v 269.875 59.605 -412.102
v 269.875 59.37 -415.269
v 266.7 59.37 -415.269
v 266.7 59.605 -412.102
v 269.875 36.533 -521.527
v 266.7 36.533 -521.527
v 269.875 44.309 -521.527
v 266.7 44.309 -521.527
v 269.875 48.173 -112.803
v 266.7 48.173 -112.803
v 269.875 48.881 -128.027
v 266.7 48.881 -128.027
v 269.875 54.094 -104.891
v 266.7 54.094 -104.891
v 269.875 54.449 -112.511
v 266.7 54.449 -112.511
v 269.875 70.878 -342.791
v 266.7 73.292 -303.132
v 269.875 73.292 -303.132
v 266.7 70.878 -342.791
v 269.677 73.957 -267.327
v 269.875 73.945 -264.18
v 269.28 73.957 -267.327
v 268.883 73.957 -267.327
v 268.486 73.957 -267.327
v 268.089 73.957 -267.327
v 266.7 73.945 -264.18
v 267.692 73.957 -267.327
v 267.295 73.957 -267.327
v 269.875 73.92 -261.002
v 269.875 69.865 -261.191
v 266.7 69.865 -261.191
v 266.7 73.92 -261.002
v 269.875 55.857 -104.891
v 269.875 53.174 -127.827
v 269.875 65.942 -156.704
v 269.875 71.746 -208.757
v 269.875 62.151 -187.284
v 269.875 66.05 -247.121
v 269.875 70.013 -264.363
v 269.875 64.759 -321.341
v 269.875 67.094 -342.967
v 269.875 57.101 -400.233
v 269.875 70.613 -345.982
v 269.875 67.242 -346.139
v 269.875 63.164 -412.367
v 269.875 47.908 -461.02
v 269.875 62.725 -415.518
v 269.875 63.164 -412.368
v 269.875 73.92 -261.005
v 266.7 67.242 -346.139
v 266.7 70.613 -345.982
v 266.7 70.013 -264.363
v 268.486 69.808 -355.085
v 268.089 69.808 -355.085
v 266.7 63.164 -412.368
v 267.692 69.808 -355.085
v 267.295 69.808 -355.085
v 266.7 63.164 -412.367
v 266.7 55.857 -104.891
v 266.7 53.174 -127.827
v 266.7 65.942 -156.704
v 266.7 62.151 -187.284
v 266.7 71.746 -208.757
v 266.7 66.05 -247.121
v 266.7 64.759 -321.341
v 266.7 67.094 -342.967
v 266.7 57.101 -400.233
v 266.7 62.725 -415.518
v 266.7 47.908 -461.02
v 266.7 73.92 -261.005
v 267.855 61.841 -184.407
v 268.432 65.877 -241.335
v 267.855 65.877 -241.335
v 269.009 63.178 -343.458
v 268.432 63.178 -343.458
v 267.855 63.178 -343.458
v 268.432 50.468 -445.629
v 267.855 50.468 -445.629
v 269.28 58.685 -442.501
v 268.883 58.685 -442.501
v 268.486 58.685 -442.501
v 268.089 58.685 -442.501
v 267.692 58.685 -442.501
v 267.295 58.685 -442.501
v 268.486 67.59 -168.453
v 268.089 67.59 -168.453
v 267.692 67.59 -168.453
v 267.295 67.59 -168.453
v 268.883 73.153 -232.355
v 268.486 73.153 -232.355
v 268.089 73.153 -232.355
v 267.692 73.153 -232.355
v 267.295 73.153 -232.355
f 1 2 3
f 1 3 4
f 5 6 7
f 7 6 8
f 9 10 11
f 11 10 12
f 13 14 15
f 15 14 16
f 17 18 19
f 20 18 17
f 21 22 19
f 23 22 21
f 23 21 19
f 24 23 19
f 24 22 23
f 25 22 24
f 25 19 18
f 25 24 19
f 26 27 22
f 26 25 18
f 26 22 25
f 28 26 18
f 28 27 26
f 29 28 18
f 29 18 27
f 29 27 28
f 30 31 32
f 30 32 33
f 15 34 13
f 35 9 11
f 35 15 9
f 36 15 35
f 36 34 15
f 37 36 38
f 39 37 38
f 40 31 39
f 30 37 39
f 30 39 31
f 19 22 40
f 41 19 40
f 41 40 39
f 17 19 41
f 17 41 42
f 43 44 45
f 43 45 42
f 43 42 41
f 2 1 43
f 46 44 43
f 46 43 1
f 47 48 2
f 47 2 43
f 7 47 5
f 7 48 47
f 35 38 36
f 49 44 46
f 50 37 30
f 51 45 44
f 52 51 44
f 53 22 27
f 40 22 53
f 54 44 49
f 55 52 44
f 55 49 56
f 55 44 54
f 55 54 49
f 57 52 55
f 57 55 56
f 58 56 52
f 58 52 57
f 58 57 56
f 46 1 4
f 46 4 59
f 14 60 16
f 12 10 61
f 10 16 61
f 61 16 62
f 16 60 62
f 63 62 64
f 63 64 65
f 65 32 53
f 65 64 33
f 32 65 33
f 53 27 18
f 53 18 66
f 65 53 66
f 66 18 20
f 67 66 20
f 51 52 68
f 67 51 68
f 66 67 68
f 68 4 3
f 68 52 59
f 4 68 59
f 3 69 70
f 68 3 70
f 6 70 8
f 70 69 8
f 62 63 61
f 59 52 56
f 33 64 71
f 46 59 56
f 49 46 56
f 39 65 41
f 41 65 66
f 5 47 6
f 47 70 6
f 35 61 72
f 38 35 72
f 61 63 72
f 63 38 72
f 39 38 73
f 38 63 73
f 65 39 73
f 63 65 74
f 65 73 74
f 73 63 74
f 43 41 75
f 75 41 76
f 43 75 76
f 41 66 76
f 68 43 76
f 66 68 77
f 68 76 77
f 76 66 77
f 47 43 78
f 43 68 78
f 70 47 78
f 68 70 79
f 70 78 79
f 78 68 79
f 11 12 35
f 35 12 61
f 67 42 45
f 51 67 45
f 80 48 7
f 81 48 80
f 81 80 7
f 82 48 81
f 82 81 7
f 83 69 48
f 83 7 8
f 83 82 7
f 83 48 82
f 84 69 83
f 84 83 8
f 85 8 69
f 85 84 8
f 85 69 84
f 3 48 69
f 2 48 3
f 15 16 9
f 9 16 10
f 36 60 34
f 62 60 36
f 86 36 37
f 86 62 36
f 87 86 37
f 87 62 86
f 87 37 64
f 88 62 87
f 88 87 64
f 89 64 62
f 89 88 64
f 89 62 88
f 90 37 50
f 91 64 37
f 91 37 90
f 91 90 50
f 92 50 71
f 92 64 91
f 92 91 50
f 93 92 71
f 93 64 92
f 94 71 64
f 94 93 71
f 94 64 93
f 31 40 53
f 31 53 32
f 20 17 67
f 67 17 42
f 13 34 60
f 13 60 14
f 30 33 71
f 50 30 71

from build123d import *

# Parameters (mm, degrees)
BOSS_EXTRUDE1_DEPTH = 3.175
CUT_EXTRUDE1_DEPTH  = 527.754935473


# Read off the part's stored shape, not the designer's step: Boss-Extrude1
with BuildPart() as part:
    # Boss-Extrude1 outline → Boss-Extrude1 (new body)
    with BuildSketch(Plane(origin=(266.7, 0, 0), x_dir=(0, 0, -1), z_dir=(1, 0, 0))):
        with BuildLine():
            Line((128.027015481, 48.881499991), (127.827266707, 53.173935834))
            add(Edge.make_bspline(
                [(127.827266707, 53.173935834), (131.921402112, 53.99855442), (147.182576255, 56.889826094), (173.722026174, 60.854887486), (207.468481867, 64.267813608), (241.316867465, 66.112676281), (275.274956706, 66.541627017), (309.305825998, 65.625236621), (343.44517215, 63.361672788), (389.065328756, 58.870907886), (445.687567425, 50.945340654), (493.519820497, 42.187423282), (518.763758442, 37.095573069), (521.527266707, 36.532698197)],
                knots=[0.059536949, 0.059536949, 0.059536949, 0.059536949, 0.082006501, 0.143206068, 0.204405634, 0.265605201, 0.326804768, 0.388004334, 0.449203901, 0.510403467, 0.6328026, 0.755201734, 0.770252495, 0.770252495, 0.770252495, 0.770252495], degree=3))
            Line((521.527266707, 36.532698197), (521.527266707, 44.308584377))
            add(Edge.make_bspline(
                [(104.891436574, 55.857271259), (106.809097214, 56.330488533), (108.731061496, 56.791798305), (116.420679251, 58.588256864), (122.190022223, 59.826974293), (133.738756637, 62.117087477), (139.518165271, 63.168162708), (151.085783849, 65.106240842), (156.874011273, 65.992917854), (168.458547012, 67.615629429), (174.254837098, 68.352003798), (185.85487642, 69.685700496), (191.6586693, 70.282209193), (209.08122178, 71.863434658), (220.711342362, 72.636362119), (243.999117493, 73.668934014), (255.656564607, 73.932445396), (278.997049406, 73.982413526), (290.68010607, 73.768516469), (308.223436016, 73.098231047), (314.074354032, 72.816241787), (325.782344918, 72.137525629), (331.639378938, 71.741522982), (343.358894278, 70.847970122), (349.22421427, 70.350159344), (360.945617689, 69.2661489), (366.799040843, 68.680082864), (396.03183172, 65.54196658), (419.308162467, 62.366180875), (465.693975492, 55.004590459), (488.803352282, 50.818147164), (515.076751448, 45.610205198), (518.30260596, 44.96300802), (521.527266707, 44.308584377)],
                knots=[0.020806935, 0.020806935, 0.020806935, 0.020806935, 0.03125, 0.03125, 0.0625, 0.0625, 0.09375, 0.09375, 0.125, 0.125, 0.15625, 0.15625, 0.1875, 0.1875, 0.25, 0.25, 0.3125, 0.3125, 0.375, 0.375, 0.40625, 0.40625, 0.4375, 0.4375, 0.46875, 0.46875, 0.5, 0.5, 0.625, 0.625, 0.75, 0.75, 0.767503331, 0.767503331, 0.767503331, 0.767503331], degree=3))
            Line((104.891436574, 55.857271259), (104.891436574, 54.094460032))
            Line((104.891436574, 54.094460032), (112.511436574, 54.449057215))
            Line((112.511436574, 54.449057215), (112.803489932, 48.173072263))
            Line((112.803489932, 48.173072263), (128.027015481, 48.881499991))
        make_face()
    extrude(amount=BOSS_EXTRUDE1_DEPTH)

    # Sketch2 → Cut-Extrude1 (cut, through all)
    with BuildSketch(Plane(origin=(269.875, 0, 0), x_dir=(0, 0, -1), z_dir=(1, 0, 0))):
        Polygon((412.10223691, 59.605171111), (412.366535562, 63.163739119), (415.53281467, 62.928576184), (415.268516018, 59.370008176), align=None)
        Polygon((261.19113958, 69.865179785), (261.002434803, 73.920357299), (264.174002738, 74.067943938), (264.362707516, 70.012766424), align=None)
        Polygon((342.791359419, 70.877658902), (342.967407763, 67.094462217), (346.138975699, 67.242048857), (345.962927354, 71.025245541), align=None)
    extrude(amount=-CUT_EXTRUDE1_DEPTH, mode=Mode.SUBTRACT)


solid = part.part
